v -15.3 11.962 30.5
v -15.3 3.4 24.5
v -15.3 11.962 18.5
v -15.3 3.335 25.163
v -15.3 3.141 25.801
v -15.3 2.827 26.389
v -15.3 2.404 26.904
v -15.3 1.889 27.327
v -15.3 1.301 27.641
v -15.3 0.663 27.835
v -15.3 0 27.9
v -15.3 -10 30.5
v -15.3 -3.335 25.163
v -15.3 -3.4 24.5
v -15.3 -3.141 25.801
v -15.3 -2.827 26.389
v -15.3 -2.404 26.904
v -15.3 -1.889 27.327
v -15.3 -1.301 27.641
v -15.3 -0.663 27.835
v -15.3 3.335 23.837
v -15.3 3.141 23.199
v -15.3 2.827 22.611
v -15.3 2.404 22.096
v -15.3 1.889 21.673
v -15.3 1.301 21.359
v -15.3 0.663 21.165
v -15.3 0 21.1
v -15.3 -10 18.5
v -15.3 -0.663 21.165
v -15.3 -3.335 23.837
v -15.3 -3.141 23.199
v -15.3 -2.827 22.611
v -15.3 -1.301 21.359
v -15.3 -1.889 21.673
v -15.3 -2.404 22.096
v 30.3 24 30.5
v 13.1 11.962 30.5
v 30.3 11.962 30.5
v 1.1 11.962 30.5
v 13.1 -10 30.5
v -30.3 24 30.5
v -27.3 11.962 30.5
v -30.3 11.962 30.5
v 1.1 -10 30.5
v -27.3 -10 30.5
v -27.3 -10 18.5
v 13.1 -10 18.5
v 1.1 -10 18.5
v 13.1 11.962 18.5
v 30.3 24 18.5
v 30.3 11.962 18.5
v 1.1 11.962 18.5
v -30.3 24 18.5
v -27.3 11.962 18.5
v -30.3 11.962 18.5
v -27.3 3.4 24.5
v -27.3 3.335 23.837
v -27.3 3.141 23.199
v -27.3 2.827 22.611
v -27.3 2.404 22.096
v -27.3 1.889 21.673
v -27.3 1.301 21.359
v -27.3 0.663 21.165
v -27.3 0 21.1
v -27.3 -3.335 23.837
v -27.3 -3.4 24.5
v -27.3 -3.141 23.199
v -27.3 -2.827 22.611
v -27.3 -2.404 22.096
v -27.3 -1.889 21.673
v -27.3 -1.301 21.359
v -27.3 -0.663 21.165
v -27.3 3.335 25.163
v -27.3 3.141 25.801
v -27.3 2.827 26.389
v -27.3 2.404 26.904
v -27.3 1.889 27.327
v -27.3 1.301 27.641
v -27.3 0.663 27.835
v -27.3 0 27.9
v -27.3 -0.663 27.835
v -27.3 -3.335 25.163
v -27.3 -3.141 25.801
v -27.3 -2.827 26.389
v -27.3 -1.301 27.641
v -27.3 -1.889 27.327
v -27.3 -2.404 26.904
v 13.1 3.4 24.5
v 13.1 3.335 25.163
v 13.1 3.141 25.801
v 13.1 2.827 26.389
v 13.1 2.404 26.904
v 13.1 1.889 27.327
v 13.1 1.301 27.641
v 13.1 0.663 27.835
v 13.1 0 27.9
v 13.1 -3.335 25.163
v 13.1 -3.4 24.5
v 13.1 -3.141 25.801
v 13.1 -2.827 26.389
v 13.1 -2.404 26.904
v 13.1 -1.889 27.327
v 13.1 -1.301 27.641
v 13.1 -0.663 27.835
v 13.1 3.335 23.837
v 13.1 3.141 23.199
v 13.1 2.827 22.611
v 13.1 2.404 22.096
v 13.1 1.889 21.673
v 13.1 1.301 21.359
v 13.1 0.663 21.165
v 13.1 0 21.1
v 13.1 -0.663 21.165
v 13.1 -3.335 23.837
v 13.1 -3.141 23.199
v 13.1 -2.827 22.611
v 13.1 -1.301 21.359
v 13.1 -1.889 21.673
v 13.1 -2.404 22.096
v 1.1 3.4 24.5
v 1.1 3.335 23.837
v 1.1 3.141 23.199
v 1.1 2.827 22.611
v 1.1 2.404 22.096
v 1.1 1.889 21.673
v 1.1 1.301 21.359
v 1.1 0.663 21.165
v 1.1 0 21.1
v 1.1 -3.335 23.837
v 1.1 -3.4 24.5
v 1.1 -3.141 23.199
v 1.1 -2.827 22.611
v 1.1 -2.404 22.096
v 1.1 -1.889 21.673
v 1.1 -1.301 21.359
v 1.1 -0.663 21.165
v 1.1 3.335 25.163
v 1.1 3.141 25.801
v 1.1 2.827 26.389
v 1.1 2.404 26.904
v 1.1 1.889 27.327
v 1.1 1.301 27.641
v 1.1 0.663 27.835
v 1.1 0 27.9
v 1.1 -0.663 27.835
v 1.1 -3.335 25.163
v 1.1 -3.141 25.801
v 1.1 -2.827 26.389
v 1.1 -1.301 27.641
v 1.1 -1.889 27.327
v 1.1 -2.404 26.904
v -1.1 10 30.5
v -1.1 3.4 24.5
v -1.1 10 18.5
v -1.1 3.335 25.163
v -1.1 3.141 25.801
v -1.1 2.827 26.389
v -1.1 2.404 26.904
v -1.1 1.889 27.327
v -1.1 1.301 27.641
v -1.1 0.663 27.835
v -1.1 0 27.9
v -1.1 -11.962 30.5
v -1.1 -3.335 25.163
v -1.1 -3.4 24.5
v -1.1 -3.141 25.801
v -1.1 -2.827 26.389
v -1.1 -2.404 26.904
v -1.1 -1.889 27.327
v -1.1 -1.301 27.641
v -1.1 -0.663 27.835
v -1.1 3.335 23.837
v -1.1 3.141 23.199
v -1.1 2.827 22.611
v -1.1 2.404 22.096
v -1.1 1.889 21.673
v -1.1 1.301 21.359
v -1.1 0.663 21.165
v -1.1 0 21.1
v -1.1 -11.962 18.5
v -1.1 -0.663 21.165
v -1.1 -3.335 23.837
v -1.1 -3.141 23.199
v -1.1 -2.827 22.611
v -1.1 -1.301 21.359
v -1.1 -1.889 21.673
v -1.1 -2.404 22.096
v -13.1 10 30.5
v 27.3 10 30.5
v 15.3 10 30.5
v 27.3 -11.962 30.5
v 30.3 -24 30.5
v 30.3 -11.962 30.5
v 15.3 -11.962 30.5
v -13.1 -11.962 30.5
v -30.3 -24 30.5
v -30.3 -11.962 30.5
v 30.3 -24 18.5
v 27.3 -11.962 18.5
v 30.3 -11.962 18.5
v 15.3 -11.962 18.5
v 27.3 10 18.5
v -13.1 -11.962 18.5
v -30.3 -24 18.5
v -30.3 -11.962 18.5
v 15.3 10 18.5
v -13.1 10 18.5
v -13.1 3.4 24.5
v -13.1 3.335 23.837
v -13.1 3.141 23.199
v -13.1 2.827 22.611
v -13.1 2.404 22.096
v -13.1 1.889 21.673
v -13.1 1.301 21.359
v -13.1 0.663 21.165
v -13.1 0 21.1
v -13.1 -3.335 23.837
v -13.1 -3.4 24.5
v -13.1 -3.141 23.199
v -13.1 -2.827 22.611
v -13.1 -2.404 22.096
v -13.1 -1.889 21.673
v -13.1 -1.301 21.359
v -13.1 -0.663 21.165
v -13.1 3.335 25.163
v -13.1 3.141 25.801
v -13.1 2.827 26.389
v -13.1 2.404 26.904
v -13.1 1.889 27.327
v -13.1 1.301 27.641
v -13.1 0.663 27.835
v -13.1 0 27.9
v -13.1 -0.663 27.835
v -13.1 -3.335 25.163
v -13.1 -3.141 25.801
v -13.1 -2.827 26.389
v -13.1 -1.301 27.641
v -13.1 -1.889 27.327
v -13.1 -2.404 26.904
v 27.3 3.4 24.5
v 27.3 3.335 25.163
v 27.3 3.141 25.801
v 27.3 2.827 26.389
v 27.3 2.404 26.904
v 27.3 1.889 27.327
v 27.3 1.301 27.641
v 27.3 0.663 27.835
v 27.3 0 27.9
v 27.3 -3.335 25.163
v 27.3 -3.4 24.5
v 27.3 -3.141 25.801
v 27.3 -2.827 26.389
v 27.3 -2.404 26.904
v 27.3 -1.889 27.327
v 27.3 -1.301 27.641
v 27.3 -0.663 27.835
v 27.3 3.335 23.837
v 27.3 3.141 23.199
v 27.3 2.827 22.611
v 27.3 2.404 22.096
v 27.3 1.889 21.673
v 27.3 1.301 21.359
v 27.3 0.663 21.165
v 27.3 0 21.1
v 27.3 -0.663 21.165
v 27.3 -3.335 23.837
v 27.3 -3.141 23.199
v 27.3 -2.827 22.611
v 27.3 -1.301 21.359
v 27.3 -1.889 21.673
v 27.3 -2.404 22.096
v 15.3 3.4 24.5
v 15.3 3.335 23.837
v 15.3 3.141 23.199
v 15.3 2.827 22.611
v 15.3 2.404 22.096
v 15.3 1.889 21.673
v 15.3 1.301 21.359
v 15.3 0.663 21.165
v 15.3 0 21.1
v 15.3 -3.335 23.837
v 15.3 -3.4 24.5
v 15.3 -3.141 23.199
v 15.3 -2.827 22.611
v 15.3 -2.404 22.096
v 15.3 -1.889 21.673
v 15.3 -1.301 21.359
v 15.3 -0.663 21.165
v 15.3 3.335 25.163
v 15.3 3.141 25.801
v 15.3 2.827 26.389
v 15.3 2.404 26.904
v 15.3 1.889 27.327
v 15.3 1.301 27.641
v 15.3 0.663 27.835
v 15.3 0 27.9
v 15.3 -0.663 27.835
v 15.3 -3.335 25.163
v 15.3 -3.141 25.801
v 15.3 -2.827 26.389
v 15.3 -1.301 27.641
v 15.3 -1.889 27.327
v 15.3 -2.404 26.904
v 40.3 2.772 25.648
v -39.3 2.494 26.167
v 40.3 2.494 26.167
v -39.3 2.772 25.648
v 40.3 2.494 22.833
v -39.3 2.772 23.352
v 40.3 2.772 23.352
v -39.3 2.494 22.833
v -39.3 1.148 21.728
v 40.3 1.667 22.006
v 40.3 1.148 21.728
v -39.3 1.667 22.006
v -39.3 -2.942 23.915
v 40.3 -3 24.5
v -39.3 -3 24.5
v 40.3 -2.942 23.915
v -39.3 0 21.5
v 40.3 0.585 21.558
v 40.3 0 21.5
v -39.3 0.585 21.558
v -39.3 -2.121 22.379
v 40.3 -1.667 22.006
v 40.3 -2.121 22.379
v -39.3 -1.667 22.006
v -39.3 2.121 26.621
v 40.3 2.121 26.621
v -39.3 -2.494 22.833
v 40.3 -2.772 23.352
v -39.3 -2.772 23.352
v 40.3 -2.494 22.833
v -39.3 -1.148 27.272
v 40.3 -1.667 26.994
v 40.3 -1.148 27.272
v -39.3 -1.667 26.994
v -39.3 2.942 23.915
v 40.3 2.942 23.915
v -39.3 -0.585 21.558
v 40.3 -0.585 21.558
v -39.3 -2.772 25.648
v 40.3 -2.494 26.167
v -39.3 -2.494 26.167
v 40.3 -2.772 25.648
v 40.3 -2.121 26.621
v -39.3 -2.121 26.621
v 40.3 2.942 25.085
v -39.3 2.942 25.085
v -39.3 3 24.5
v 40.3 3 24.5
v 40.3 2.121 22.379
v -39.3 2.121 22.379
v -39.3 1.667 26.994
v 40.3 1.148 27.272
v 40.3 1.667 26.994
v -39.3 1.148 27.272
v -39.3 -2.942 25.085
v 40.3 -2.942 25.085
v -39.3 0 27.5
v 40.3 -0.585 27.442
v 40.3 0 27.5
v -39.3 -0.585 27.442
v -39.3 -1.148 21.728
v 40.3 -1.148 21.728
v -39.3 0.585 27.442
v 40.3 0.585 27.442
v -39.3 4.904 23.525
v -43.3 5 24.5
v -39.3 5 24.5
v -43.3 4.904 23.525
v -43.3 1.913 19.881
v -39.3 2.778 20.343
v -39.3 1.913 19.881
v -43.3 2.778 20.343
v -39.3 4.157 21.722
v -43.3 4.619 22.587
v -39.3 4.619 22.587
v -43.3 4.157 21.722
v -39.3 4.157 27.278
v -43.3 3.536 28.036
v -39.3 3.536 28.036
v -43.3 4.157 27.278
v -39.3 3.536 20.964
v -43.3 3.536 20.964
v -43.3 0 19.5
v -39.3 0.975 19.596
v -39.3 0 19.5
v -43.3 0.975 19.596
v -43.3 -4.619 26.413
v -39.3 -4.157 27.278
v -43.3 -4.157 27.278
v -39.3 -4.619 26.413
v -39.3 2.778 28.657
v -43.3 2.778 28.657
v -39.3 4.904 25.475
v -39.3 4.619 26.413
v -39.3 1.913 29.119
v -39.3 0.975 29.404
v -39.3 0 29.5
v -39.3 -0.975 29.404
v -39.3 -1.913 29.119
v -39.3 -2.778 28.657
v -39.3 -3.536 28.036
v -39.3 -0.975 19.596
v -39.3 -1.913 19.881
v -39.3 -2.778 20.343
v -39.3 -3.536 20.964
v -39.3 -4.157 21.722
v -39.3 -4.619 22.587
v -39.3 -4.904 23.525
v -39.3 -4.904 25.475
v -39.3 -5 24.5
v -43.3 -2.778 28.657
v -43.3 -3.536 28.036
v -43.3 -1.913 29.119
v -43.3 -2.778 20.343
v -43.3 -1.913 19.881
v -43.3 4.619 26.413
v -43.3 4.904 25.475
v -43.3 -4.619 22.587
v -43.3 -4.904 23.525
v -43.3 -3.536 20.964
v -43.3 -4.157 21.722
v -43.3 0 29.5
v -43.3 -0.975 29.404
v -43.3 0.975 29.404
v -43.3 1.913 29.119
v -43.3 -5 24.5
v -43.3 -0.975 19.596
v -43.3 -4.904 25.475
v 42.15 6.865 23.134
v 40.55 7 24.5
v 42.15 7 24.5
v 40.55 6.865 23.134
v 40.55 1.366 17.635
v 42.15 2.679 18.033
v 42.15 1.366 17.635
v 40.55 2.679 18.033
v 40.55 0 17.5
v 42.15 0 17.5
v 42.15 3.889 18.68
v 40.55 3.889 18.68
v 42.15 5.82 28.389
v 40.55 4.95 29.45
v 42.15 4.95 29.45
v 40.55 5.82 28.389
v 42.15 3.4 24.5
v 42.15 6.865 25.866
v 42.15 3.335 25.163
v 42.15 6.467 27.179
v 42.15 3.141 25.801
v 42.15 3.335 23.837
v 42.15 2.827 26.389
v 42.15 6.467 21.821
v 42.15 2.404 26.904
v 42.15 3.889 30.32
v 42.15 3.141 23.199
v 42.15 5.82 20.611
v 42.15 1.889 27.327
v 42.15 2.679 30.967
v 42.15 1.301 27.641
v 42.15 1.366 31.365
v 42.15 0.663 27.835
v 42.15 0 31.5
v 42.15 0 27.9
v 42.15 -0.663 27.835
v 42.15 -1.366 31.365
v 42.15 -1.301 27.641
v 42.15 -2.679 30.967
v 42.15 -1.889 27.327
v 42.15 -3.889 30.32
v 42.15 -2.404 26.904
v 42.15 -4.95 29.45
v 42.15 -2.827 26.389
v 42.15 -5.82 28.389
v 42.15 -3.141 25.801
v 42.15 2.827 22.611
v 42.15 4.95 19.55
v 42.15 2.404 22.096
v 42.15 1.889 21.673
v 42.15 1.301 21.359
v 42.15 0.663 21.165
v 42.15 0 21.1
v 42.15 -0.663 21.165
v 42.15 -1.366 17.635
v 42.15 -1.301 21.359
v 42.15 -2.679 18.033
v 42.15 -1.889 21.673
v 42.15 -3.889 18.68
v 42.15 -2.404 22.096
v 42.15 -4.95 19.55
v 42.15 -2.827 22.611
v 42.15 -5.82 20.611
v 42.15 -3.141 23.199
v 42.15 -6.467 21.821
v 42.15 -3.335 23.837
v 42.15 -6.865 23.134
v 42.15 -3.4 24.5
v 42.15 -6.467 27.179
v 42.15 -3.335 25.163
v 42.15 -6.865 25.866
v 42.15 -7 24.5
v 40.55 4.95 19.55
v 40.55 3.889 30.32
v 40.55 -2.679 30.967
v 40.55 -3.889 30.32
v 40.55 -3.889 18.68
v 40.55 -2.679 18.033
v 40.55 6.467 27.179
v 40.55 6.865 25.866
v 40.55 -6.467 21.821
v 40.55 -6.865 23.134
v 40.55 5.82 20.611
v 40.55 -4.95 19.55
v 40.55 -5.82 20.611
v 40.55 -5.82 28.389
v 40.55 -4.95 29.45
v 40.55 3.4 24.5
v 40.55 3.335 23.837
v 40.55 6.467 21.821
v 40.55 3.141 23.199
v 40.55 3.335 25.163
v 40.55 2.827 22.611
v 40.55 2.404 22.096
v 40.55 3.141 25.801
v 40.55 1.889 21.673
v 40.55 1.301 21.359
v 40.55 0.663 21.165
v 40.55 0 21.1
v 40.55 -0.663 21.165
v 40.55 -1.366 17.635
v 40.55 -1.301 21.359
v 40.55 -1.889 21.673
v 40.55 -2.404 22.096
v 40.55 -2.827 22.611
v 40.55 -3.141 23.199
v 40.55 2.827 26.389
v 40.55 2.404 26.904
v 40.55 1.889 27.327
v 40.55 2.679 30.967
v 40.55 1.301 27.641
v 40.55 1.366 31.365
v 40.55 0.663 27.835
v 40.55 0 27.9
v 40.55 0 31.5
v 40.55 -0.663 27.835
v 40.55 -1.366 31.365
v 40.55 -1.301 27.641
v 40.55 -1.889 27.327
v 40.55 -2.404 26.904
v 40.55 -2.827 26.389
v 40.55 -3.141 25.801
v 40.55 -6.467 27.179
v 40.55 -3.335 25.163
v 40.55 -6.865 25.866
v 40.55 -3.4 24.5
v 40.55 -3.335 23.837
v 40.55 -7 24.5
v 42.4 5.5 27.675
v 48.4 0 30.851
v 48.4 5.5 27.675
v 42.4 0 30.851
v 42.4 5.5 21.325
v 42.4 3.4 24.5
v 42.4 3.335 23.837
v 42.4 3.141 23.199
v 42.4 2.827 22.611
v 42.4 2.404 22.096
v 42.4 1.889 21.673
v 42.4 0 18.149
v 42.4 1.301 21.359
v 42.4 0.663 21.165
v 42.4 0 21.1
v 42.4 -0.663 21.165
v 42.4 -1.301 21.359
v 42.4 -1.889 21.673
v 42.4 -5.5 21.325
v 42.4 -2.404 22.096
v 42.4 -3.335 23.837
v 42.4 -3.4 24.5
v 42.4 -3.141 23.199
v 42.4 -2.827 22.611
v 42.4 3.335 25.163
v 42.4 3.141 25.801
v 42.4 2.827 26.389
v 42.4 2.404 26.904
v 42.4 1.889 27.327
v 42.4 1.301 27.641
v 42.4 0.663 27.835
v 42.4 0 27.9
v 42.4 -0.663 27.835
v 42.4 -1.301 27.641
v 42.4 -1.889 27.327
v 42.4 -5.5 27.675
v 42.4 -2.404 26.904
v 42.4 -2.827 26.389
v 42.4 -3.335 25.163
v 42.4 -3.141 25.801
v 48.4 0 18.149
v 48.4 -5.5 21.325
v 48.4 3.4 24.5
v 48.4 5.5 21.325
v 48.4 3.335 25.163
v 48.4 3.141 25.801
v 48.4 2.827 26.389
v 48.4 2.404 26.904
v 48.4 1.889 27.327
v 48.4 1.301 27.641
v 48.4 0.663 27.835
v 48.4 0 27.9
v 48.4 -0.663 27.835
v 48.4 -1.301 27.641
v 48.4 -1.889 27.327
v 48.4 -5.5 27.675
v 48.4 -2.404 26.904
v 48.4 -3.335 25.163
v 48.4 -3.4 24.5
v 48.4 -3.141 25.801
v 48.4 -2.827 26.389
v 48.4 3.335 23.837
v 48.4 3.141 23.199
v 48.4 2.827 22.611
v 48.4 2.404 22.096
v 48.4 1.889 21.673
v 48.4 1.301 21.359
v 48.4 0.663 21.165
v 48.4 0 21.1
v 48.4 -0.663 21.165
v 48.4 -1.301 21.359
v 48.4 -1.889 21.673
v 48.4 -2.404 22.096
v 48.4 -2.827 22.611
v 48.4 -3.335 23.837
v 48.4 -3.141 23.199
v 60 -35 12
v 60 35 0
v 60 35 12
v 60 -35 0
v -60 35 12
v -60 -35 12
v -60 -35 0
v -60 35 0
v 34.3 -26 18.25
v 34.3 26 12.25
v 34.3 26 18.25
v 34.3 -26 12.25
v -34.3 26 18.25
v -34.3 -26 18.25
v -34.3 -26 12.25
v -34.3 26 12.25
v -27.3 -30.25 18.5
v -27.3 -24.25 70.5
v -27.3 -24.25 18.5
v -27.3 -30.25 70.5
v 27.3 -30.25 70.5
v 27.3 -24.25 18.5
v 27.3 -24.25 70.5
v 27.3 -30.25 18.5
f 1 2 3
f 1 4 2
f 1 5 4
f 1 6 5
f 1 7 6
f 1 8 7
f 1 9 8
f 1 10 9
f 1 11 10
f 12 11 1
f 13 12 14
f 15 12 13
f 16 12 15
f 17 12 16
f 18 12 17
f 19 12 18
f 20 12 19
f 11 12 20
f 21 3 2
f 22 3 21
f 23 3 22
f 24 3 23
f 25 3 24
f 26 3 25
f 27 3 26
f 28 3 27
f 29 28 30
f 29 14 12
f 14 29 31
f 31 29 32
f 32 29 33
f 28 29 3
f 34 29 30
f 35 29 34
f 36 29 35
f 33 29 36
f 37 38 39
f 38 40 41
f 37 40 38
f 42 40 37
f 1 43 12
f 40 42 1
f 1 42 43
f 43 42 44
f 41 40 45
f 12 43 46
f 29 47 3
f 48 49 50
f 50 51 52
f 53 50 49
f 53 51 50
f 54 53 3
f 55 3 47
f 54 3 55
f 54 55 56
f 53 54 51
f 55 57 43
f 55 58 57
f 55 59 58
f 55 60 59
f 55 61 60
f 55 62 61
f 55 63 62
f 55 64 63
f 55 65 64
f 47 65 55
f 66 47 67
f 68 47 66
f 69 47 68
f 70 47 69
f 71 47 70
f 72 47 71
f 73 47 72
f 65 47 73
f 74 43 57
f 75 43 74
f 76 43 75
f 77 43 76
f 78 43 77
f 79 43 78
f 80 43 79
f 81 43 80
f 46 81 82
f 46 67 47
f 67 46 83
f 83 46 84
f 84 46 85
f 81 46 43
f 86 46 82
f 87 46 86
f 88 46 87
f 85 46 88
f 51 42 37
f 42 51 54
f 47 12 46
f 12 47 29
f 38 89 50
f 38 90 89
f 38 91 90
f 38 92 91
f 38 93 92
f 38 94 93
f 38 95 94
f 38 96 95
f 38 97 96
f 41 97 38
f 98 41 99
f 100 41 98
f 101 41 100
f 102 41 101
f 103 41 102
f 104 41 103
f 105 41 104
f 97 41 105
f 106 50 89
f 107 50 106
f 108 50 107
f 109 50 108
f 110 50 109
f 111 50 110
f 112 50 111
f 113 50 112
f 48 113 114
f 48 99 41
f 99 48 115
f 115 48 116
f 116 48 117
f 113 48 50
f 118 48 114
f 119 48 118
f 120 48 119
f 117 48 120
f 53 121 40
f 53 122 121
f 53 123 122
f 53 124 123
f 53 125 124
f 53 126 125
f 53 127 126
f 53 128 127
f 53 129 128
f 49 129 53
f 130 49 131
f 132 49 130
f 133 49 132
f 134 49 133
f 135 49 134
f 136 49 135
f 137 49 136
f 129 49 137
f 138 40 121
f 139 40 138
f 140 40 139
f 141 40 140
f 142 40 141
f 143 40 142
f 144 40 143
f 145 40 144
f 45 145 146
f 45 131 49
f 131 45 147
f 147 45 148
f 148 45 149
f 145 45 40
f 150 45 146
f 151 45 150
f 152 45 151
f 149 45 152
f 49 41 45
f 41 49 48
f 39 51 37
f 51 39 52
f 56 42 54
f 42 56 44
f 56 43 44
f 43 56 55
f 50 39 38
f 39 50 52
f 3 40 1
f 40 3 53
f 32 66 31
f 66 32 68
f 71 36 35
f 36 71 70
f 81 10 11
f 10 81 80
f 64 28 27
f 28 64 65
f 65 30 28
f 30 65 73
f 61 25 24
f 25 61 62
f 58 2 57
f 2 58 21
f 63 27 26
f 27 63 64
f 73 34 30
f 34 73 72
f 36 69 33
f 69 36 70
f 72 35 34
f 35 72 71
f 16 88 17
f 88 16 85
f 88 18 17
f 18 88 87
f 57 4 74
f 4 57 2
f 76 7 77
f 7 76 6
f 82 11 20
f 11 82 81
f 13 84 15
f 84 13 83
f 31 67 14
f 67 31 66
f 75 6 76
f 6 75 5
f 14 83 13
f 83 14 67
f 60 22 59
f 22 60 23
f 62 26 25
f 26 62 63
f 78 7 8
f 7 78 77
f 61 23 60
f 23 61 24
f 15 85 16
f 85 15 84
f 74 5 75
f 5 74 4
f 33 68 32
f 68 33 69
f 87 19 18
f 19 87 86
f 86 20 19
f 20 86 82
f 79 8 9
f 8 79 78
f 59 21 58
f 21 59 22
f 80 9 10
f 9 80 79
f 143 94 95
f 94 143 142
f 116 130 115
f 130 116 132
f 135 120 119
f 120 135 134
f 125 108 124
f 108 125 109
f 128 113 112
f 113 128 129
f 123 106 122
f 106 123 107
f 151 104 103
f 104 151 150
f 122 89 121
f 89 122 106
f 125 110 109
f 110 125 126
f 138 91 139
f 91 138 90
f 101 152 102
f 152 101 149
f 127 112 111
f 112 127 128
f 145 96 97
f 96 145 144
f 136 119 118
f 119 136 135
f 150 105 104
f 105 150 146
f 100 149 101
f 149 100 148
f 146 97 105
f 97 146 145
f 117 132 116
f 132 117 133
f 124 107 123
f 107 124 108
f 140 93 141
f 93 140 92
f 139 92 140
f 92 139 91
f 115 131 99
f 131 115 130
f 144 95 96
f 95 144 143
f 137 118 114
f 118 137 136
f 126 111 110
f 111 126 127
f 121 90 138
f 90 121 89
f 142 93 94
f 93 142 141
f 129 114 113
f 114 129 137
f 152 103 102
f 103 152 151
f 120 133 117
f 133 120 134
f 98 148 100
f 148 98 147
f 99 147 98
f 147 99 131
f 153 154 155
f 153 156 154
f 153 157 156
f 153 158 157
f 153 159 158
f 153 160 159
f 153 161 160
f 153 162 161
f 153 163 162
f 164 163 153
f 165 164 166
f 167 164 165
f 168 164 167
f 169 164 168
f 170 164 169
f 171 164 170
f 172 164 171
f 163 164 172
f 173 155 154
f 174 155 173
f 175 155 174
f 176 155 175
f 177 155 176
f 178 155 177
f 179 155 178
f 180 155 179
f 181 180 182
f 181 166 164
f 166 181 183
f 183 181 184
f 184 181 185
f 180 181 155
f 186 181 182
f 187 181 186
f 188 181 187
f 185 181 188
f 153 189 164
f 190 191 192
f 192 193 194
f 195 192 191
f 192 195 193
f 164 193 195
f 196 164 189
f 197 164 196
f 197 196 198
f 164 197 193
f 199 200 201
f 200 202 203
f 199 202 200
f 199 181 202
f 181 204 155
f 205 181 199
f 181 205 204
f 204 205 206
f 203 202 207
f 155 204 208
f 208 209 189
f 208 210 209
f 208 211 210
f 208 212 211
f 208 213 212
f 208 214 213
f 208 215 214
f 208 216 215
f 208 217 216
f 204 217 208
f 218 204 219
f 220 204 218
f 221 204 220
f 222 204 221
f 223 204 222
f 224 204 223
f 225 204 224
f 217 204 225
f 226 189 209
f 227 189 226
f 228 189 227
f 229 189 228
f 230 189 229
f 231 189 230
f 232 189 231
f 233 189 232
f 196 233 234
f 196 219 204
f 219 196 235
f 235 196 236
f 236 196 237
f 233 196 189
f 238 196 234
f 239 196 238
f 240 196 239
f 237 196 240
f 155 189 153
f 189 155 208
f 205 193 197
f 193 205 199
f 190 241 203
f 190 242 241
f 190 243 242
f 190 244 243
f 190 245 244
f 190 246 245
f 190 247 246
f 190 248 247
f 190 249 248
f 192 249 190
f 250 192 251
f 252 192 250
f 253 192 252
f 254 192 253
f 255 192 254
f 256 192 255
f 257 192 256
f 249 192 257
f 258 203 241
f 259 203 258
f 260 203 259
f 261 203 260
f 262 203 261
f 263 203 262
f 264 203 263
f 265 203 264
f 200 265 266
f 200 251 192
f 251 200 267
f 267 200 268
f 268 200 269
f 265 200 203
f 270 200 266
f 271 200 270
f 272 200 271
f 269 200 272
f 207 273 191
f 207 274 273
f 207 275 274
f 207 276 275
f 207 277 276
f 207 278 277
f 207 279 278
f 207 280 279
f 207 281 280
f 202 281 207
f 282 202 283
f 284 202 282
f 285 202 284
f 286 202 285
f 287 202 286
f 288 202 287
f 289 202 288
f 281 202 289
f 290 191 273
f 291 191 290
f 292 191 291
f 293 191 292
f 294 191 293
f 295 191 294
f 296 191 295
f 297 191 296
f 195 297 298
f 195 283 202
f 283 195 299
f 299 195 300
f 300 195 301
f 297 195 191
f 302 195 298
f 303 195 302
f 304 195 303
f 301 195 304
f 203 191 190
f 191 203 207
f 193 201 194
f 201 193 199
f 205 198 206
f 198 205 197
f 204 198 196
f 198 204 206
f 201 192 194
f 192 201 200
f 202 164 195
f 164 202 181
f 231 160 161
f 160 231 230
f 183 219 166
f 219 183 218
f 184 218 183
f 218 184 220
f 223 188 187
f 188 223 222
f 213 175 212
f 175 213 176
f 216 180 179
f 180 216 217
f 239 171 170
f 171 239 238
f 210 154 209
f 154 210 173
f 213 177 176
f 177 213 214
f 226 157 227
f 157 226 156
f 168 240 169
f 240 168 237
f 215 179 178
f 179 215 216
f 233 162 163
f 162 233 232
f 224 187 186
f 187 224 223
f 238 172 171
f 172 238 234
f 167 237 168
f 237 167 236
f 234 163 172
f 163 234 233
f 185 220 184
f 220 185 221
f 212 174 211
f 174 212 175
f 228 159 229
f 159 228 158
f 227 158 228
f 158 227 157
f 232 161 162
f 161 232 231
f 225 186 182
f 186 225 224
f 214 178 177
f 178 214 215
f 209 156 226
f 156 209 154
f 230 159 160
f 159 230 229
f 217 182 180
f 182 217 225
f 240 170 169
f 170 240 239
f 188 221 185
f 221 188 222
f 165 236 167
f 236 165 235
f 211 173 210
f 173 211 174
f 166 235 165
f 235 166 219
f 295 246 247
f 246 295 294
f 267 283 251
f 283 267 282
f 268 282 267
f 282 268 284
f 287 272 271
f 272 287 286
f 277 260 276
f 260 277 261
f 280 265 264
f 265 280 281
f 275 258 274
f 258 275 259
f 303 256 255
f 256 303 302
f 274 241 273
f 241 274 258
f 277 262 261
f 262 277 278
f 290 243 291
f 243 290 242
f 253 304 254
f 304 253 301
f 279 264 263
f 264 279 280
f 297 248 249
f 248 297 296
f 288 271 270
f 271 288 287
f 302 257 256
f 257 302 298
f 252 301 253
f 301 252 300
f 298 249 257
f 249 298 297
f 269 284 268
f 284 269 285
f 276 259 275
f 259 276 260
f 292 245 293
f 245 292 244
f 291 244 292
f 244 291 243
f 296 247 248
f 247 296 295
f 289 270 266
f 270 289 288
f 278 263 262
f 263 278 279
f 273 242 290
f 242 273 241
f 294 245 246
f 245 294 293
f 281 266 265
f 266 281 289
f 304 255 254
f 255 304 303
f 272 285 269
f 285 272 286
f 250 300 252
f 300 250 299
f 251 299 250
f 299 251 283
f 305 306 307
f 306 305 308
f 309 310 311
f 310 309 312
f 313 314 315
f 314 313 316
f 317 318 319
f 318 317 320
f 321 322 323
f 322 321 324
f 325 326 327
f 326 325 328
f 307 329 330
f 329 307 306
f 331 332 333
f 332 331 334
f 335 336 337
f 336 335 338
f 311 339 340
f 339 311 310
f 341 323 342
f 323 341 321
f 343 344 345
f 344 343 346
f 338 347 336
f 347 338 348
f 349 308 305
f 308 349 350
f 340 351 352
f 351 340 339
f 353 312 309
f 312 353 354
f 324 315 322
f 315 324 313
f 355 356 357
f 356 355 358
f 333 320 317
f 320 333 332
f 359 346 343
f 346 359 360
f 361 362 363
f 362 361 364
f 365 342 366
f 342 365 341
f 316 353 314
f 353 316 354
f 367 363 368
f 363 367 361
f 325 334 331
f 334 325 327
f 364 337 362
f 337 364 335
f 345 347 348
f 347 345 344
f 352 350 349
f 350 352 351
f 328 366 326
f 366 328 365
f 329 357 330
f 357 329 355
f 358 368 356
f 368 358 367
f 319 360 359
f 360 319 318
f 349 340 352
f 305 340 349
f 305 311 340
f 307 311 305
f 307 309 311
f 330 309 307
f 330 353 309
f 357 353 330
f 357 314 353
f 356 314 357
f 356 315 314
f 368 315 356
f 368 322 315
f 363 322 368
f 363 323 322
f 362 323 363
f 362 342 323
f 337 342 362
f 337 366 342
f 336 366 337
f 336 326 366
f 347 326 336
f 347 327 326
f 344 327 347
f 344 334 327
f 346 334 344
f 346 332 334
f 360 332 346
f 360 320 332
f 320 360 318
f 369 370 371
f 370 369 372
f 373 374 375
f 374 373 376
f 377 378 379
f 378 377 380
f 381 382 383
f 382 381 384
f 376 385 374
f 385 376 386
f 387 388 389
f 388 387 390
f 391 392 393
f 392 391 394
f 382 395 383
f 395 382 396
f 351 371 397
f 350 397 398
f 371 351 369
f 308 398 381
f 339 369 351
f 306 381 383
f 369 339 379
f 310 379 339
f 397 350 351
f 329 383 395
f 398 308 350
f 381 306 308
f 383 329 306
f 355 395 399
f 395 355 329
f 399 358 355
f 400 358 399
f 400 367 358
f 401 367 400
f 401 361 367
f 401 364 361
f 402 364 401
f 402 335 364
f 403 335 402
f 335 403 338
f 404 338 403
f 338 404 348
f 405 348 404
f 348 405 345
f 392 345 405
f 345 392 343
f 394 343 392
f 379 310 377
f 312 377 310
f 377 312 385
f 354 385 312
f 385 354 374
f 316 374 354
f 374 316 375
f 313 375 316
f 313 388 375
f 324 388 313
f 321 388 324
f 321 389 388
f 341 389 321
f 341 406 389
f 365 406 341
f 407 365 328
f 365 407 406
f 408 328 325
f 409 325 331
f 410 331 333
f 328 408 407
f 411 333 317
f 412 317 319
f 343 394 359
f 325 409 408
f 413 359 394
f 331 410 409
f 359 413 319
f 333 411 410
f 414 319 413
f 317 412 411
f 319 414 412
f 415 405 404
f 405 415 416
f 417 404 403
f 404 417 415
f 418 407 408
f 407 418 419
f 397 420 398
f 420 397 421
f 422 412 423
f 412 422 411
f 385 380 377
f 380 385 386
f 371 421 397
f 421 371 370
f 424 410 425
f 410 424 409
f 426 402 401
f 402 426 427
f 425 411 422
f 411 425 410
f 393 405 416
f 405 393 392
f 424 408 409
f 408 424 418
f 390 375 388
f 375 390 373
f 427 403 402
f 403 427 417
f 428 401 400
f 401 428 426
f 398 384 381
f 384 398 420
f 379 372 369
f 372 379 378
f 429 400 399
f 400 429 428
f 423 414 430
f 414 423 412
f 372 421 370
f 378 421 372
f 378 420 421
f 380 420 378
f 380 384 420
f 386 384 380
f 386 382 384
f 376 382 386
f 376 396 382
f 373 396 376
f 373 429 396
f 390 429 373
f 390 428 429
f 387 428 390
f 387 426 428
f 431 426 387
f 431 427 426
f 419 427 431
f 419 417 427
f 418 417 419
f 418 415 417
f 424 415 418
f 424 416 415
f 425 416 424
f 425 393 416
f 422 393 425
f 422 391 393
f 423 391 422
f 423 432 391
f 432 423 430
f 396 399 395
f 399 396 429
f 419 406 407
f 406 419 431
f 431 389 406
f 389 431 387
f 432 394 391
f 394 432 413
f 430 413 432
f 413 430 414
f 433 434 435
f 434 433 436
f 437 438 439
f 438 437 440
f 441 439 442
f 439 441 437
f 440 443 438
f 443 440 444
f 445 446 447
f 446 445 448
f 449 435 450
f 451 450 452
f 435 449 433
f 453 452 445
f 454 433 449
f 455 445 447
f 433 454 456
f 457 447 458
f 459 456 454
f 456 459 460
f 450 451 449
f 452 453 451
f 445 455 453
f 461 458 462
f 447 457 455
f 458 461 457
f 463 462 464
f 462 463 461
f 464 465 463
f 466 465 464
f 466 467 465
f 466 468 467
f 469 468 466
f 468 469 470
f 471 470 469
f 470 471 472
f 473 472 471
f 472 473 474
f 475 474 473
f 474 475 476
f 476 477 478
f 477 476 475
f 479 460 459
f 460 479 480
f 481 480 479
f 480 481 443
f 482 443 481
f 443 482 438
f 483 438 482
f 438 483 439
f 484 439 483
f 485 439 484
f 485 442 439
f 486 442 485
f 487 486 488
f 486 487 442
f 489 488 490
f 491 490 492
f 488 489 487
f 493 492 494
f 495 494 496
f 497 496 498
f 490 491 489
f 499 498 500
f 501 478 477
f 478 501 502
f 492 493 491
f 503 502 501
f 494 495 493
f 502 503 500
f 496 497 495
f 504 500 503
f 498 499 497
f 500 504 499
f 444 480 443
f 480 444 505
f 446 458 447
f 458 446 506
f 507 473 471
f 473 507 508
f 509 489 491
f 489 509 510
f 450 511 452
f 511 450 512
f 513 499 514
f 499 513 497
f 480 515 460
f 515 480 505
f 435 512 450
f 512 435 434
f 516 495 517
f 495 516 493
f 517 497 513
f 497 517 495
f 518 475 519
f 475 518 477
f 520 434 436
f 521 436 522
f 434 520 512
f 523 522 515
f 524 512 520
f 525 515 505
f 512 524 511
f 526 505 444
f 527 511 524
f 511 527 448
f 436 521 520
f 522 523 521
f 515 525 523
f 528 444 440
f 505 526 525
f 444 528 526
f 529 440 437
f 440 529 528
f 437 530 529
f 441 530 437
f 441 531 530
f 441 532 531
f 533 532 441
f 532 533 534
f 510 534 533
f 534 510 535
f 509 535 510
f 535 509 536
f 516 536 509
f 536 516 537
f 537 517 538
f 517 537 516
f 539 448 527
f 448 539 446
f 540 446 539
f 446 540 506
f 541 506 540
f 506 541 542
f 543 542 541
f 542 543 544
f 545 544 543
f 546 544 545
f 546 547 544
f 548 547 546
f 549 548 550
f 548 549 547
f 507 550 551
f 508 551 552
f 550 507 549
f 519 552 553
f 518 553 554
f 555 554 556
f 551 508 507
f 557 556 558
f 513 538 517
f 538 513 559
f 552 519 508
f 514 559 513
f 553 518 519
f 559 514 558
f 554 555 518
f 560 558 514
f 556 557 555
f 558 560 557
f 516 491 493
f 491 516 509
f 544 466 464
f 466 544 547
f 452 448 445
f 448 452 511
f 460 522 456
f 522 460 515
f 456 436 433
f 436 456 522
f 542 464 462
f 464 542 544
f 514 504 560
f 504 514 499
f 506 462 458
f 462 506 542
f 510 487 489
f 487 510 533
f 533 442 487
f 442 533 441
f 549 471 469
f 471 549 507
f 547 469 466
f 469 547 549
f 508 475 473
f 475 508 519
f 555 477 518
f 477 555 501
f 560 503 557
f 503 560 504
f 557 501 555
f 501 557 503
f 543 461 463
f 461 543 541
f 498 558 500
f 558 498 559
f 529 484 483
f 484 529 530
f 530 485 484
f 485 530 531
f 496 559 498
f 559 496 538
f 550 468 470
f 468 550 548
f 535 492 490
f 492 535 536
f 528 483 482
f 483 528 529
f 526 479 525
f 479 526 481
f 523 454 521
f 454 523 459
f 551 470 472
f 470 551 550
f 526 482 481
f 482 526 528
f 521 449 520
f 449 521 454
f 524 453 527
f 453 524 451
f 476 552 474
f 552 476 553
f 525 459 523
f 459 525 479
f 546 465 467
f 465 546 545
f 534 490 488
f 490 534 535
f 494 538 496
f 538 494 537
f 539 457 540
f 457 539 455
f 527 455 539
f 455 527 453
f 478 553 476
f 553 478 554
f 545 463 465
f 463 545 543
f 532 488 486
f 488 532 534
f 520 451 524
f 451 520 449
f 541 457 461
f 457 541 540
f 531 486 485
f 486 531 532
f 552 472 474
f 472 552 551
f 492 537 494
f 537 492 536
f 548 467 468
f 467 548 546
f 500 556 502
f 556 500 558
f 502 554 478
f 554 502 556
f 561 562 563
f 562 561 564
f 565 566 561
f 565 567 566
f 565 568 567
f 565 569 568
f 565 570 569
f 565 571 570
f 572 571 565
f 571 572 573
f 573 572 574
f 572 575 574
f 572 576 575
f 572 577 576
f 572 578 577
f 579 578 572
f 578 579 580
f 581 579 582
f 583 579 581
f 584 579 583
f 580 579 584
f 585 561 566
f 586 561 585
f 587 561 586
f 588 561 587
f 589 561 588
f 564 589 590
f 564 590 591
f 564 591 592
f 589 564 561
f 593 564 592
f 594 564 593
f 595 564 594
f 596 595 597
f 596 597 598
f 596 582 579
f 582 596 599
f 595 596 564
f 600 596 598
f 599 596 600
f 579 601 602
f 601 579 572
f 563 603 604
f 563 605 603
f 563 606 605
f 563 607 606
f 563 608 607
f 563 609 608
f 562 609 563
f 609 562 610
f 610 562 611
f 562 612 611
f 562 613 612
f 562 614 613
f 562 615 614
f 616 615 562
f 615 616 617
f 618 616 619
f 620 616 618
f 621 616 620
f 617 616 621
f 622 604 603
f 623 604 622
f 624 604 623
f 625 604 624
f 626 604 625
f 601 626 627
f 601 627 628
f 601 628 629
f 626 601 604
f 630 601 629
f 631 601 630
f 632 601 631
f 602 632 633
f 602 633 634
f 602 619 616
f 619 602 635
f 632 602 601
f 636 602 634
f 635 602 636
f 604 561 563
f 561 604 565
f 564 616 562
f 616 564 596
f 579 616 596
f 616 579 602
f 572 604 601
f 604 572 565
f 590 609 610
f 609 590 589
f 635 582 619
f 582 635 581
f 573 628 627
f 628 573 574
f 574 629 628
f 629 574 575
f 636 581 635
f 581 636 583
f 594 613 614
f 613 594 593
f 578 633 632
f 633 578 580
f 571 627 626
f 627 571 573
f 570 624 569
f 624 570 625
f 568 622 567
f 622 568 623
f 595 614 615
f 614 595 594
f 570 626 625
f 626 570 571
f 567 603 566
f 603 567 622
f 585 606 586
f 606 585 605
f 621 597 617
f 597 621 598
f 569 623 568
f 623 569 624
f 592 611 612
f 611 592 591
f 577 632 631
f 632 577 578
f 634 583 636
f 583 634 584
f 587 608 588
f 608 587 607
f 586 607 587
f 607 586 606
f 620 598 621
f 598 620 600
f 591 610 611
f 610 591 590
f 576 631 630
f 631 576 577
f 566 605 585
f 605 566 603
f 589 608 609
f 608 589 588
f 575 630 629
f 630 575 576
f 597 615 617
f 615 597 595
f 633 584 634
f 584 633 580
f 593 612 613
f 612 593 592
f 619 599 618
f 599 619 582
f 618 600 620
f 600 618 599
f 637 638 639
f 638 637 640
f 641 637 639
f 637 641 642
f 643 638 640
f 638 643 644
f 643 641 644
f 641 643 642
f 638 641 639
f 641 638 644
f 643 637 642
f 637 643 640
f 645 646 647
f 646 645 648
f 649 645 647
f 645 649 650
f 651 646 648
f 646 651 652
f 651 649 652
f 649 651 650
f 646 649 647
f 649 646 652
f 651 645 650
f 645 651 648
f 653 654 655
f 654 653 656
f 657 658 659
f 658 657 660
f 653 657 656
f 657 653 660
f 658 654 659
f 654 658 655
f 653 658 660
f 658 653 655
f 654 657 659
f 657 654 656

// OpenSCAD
$fn = 32;

// ------------------------------------------------------------------------
// Comb hinge with flap: leaf 60.6 x 24 mm, pin d6, flap 52 mm
// Every part is its own module, assembly() places every instance.
// ------------------------------------------------------------------------

// --- part 1 ---
module hinge_bed() {
  difference() {
    translate([-60, -35, 0]) cube([120, 70, 12]);
  }
}

// --- part 2 ---
module hinge_riser() {
  difference() {
    translate([-34.3, -26, 0]) cube([68.6, 52, 6]);
  }
}

// --- part 3 ---
module hinge_leaf_a() {
  difference() {
    union() {
      translate([-27.3, -10, -6]) cube([12, 34, 12]);
      translate([1.1, -10, -6]) cube([12, 34, 12]);
      translate([-30.3, 11.962, -6]) cube([60.6, 12.038, 12]);
    }
    translate([-21.3, 0, 0]) rotate([0, 90, 0]) cylinder(h = 14, d = 6.8, center = true);
    translate([7.1, 0, 0]) rotate([0, 90, 0]) cylinder(h = 14, d = 6.8, center = true);
  }
}

// --- part 4 ---
module hinge_leaf_b() {
  difference() {
    union() {
      translate([-13.1, -24, -6]) cube([12, 34, 12]);
      translate([15.3, -24, -6]) cube([12, 34, 12]);
      translate([-30.3, -24, -6]) cube([60.6, 12.038, 12]);
    }
    translate([-7.1, 0, 0]) rotate([0, 90, 0]) cylinder(h = 14, d = 6.8, center = true);
    translate([21.3, 0, 0]) rotate([0, 90, 0]) cylinder(h = 14, d = 6.8, center = true);
  }
}

// --- part 5 ---
module hinge_flap() {
  difference() {
    translate([-27.3, -26, 0]) cube([54.6, 52, 6]);
  }
}

// --- part 6 ---
module hinge_pin() {
  rotate([0, 90, 0]) cylinder(h = 80.6, d = 6, center = true);
  translate([-43.3, 0, 0]) rotate([0, 90, 0]) cylinder(h = 4, d = 10);
}

// --- part 7 ---
module pin_washer() {
  difference() {
      translate([0, 0, 0]) cylinder(h = 1.6, d = 14);
      translate([0, 0, -1]) cylinder(h = 3.6, d = 6.8);
    }
}

// --- part 8 ---
module pin_nut() {
  difference() {
    linear_extrude(height = 6) polygon(points = [[6.351, 0], [3.175, 5.5], [-3.175, 5.5], [-6.351, 0], [-3.175, -5.5], [3.175, -5.5]]);
    translate([0, 0, -1]) cylinder(h = 8, d = 6.8);
  }
}

// --- assembly ---
module assembly() {
  color([0.80, 0.24, 0.20]) translate([0, 0, 0]) rotate([0, 0, 0]) hinge_bed();
  color([0.20, 0.45, 0.75]) translate([0, 0, 12.25]) rotate([0, 0, 0]) hinge_riser();
  color([0.25, 0.62, 0.32]) translate([0, 0, 24.5]) rotate([0, 0, 0]) hinge_leaf_a();
  color([0.92, 0.70, 0.18]) translate([0, 0, 24.5]) rotate([0, 0, 0]) hinge_leaf_b();
  color([0.58, 0.35, 0.70]) translate([0, -24.25, 44.5]) rotate([90, 0, 0]) hinge_flap();
  color([0.16, 0.66, 0.66]) translate([0, 0, 24.5]) rotate([0, 0, 0]) hinge_pin();
  color([0.85, 0.48, 0.18]) translate([40.55, 0, 24.5]) rotate([0, 90, 0]) pin_washer();
  color([0.55, 0.60, 0.65]) translate([42.4, 0, 24.5]) rotate([0, 90, 0]) pin_nut();
}

assembly();
